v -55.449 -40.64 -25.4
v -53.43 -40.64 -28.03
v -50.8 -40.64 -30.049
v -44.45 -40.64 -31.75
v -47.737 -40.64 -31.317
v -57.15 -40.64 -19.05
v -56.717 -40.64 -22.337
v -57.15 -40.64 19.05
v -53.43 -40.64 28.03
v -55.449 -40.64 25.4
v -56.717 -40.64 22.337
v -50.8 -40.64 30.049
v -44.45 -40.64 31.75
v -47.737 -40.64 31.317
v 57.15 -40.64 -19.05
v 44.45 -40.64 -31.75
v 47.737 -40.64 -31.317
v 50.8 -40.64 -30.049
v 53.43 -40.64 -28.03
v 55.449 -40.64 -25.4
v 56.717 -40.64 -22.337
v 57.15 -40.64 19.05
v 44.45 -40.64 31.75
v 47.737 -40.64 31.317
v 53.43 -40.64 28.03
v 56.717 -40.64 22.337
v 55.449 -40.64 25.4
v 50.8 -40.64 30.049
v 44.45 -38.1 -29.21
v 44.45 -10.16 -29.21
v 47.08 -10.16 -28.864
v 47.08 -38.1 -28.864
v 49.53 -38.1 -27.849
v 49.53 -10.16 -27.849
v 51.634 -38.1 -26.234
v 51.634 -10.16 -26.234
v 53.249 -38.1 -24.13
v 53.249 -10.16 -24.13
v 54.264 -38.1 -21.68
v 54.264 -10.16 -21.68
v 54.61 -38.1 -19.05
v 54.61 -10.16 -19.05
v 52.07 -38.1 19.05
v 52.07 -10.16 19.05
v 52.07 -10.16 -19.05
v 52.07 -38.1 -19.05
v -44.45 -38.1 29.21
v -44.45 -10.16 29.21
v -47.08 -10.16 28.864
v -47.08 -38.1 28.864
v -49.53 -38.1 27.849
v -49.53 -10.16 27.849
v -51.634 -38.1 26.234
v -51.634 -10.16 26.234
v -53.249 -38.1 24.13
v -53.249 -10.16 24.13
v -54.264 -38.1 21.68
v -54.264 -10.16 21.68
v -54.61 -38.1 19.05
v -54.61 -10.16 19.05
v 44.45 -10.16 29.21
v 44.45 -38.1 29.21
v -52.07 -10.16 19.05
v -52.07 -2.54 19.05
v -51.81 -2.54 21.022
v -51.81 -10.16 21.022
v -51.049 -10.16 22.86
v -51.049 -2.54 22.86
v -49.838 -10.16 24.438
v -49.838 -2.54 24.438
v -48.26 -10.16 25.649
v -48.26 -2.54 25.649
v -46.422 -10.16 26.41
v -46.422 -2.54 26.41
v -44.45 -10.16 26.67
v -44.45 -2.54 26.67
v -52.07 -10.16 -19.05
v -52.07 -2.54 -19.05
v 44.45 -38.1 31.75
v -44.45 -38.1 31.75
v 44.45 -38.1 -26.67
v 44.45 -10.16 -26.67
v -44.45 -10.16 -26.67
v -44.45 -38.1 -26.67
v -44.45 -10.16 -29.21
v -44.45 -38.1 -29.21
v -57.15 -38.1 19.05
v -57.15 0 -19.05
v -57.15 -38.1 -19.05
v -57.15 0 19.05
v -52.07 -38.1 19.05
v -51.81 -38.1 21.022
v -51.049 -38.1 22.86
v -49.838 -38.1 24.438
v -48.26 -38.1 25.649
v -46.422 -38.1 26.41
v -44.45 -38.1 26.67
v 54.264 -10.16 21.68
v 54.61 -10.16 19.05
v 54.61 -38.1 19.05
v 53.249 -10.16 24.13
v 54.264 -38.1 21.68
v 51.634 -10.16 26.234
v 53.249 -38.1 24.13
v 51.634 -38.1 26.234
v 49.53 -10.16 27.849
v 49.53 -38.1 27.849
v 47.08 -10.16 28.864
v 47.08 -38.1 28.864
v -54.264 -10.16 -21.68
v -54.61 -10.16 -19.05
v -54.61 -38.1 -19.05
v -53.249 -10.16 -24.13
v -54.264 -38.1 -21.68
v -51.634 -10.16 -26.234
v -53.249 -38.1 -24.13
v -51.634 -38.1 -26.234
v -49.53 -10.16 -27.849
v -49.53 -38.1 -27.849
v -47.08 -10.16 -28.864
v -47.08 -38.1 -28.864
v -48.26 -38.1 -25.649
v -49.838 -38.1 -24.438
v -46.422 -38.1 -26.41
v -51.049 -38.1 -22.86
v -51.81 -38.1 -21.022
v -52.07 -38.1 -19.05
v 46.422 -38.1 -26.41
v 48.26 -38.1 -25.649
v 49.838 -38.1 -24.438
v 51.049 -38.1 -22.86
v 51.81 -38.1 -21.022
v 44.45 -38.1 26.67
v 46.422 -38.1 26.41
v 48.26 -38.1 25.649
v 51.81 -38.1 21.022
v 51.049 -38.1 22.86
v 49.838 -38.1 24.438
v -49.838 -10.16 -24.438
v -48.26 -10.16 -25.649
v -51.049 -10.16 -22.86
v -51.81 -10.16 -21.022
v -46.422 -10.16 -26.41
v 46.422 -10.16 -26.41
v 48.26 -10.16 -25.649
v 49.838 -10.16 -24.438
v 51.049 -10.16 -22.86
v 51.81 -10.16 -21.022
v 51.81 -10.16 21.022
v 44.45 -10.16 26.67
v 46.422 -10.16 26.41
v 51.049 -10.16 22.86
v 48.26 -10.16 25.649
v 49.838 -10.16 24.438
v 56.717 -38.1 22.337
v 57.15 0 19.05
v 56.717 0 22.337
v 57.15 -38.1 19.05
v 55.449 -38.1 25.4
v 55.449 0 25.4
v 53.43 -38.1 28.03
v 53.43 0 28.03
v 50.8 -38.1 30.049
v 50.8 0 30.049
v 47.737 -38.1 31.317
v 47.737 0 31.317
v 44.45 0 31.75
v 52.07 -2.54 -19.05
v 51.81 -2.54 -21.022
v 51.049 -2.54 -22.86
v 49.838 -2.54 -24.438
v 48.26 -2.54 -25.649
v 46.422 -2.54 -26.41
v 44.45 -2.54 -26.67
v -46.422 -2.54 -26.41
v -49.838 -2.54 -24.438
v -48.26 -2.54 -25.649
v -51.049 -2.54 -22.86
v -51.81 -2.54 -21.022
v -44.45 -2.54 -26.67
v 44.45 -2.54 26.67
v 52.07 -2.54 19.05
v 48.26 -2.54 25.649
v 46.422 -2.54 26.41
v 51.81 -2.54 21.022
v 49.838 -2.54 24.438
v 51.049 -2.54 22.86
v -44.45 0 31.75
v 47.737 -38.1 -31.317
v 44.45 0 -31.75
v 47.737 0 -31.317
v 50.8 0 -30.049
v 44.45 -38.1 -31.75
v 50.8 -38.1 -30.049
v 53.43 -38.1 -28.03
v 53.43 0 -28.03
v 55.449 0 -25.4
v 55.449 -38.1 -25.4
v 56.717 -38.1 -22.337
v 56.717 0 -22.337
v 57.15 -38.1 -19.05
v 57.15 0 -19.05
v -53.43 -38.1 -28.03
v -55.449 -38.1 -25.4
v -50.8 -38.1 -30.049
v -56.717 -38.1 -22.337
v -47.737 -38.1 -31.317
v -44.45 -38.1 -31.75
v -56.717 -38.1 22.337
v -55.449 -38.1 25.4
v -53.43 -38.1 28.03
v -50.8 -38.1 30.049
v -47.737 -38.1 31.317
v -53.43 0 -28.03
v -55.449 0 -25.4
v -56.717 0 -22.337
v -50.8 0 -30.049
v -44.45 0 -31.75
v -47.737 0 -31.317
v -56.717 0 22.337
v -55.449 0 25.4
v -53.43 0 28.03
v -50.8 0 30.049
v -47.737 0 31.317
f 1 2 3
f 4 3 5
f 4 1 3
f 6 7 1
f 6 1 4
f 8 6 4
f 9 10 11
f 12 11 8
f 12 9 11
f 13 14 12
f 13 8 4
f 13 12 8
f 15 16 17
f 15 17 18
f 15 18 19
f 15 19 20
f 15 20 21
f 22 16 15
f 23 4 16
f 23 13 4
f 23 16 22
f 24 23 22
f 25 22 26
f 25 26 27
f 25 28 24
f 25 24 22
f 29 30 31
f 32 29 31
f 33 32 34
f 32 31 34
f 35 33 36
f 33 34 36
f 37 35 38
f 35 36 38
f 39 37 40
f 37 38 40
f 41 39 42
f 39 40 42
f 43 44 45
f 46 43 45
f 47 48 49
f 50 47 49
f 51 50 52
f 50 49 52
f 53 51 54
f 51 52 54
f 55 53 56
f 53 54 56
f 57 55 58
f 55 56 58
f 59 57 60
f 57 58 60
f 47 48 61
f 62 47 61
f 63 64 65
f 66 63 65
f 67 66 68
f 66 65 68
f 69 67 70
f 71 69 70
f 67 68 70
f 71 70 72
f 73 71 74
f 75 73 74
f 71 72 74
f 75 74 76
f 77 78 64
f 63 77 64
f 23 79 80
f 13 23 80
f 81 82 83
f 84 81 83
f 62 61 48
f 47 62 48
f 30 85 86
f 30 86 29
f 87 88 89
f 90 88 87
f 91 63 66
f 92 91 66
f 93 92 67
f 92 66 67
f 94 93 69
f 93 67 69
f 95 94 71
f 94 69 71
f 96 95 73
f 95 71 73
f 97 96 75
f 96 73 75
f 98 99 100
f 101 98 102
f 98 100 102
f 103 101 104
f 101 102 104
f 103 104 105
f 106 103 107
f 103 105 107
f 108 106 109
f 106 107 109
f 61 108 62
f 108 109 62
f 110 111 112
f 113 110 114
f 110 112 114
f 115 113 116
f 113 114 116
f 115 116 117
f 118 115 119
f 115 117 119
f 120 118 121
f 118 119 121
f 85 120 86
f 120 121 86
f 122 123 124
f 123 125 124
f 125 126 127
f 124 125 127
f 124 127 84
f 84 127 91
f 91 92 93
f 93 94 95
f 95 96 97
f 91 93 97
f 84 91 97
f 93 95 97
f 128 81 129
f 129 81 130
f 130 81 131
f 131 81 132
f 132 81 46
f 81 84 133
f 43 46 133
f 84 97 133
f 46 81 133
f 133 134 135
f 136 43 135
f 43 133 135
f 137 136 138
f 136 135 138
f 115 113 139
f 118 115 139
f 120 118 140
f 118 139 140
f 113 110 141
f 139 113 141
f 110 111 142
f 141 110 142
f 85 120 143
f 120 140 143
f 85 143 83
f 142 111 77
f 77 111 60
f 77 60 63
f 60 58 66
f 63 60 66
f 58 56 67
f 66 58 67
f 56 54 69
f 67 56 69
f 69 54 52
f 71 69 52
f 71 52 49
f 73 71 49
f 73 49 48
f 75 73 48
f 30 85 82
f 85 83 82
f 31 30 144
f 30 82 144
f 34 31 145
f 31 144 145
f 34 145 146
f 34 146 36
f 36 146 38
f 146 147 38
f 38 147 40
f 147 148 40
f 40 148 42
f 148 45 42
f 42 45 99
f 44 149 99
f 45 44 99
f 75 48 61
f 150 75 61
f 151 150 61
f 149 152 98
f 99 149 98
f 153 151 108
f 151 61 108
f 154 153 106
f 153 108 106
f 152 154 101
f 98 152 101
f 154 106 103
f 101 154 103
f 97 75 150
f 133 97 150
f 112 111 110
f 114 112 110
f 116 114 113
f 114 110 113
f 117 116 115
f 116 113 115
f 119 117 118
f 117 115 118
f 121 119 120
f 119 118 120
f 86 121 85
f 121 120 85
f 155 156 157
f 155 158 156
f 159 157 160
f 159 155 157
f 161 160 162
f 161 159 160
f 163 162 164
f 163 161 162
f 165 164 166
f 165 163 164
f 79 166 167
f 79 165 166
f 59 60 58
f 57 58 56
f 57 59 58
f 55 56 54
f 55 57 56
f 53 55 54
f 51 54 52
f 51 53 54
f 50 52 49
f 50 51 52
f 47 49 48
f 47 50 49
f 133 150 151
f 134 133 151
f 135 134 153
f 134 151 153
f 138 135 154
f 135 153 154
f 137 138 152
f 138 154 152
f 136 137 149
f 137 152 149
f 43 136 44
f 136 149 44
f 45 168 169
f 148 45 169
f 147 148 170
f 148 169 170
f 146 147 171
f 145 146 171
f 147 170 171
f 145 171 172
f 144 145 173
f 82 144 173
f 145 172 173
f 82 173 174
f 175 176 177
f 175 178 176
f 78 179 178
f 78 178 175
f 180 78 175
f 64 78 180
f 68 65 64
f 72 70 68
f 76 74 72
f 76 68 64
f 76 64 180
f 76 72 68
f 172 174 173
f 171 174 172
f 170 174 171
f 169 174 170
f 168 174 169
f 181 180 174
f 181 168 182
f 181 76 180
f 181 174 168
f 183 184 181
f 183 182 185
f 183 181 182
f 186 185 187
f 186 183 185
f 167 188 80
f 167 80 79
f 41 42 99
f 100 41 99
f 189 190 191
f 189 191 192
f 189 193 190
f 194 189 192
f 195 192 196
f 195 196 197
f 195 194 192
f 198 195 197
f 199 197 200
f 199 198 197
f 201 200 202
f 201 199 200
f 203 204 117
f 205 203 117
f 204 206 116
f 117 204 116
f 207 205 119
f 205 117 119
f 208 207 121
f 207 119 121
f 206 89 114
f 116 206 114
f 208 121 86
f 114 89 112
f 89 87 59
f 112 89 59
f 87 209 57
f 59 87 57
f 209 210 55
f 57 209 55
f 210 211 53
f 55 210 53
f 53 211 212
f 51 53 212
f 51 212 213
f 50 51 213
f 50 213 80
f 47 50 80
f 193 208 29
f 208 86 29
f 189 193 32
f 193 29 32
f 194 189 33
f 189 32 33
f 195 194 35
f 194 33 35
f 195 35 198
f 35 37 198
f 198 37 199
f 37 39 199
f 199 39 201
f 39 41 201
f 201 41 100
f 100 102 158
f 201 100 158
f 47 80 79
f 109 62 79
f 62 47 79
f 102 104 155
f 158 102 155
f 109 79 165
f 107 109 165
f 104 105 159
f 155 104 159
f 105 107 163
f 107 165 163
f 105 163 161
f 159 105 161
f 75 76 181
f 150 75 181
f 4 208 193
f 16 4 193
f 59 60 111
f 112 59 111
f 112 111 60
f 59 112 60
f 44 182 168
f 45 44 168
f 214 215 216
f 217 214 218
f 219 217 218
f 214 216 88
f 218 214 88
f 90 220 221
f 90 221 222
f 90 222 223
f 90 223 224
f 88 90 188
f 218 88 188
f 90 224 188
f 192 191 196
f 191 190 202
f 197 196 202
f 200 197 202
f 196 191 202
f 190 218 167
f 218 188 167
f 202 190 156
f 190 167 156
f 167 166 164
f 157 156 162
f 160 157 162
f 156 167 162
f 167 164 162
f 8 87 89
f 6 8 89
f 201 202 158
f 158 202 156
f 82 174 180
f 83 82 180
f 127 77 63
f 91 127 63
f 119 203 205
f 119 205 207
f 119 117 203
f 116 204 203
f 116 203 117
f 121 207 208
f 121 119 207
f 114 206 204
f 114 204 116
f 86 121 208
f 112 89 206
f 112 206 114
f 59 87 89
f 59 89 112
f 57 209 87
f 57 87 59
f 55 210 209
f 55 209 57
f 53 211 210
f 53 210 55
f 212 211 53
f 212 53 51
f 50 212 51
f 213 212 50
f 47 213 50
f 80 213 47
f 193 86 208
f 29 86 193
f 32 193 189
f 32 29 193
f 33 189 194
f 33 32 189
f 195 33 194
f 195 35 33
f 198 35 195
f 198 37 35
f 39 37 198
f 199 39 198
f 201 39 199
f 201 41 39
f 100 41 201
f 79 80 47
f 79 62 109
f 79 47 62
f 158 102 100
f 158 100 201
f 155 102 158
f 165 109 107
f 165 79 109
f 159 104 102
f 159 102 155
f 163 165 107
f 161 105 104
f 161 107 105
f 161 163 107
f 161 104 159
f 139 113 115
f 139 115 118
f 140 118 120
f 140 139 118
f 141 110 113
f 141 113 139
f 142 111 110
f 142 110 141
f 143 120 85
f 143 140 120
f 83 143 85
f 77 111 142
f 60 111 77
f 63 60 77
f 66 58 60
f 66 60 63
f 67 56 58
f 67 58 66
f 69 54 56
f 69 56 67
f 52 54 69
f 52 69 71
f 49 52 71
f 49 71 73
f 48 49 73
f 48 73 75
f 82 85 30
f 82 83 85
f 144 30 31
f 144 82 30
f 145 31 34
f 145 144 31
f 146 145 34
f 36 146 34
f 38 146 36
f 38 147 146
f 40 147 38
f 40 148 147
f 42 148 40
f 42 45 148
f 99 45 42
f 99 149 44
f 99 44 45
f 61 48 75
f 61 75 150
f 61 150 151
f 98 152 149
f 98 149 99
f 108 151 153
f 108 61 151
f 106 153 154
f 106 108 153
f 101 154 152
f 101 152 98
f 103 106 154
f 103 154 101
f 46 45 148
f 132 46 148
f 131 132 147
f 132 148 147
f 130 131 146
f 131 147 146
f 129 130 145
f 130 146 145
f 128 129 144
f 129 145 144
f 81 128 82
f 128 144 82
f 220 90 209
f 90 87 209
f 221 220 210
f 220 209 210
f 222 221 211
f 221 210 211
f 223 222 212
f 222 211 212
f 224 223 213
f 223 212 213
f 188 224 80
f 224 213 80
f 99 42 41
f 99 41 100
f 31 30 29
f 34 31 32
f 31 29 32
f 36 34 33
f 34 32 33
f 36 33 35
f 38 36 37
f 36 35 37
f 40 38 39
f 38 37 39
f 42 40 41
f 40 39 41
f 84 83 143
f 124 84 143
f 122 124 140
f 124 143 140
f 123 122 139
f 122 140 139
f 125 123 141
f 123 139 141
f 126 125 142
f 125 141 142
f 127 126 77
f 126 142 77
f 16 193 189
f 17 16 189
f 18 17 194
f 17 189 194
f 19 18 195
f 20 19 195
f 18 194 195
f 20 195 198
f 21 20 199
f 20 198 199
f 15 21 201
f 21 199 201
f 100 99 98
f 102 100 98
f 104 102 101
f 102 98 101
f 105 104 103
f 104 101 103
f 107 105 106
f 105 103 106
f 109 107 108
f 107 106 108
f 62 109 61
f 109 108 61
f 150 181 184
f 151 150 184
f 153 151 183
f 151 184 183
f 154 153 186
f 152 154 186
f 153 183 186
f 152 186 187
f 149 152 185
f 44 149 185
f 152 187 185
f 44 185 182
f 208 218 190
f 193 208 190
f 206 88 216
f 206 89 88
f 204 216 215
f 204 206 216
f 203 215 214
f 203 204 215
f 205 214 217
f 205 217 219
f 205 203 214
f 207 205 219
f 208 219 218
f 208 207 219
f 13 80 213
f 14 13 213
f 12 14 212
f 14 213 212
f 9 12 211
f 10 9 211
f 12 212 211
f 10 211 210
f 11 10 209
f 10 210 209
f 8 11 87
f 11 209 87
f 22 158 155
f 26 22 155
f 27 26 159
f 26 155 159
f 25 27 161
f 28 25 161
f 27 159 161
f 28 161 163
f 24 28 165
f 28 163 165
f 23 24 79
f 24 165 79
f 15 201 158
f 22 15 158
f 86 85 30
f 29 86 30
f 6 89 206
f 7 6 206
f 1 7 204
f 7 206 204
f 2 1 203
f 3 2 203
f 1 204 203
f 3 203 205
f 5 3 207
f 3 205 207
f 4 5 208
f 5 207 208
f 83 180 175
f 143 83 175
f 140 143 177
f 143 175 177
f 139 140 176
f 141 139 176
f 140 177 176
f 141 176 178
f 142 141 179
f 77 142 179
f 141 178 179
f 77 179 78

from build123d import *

# Parameters (mm, degrees)
F5_W     = 114.3
F5_H     = 63.5
F6_DEPTH = 38.1
F0_R     = 12.7
F1_T     = -2.54
F8_DEPTH = 7.62
F9_DEPTH = 27.94
F3_DEPTH = 2.54


with BuildPart() as f6:
    # F5 (on Front) → F6 (new body)
    with BuildSketch(Plane.XZ):
        Rectangle(F5_W, F5_H)
    extrude(amount=F6_DEPTH)

    # F0
    f0_edges = [f6.edges().sort_by_distance(p)[0] for p in [
        (57.15, -19.05, 31.75),
        (57.15, -19.05, -31.75),
        (-57.15, -19.05, -31.75),
        (-57.15, -19.05, 31.75),
    ]]
    fillet(f0_edges, radius=F0_R)

    # F1
    f1_openings = [f6.faces().sort_by_distance(p)[0] for p in [
        (0, -38.1, 0),
    ]]
    offset(amount=F1_T, openings=f1_openings)

    # F7 (on face) → F8 (join)
    with BuildSketch(Plane.XZ.offset(2.54)):
        with BuildLine():
            ThreePointArc((54.61, 19.05), (51.6342048969, 26.2342048969), (44.45, 29.21))
            Line((44.45, 29.21), (-44.45, 29.21))
            ThreePointArc((-44.45, 29.21), (-51.6342048969, 26.2342048969), (-54.61, 19.05))
            Line((-54.61, 19.05), (-54.61, -19.05))
            ThreePointArc((-54.61, -19.05), (-51.6342048969, -26.2342048969), (-44.45, -29.21))
            Line((-44.45, -29.21), (44.45, -29.21))
            ThreePointArc((44.45, -29.21), (51.6342048969, -26.2342048969), (54.61, -19.05))
            Line((54.61, -19.05), (54.61, 19.05))
        make_face()
        with BuildLine():
            Line((-44.45, 26.67), (44.45, 26.67))
            ThreePointArc((44.45, 26.67), (49.8381536726, 24.4381536726), (52.07, 19.05))
            Line((52.07, 19.05), (52.07, -19.05))
            ThreePointArc((52.07, -19.05), (49.8381536726, -24.4381536726), (44.45, -26.67))
            Line((44.45, -26.67), (-44.45, -26.67))
            ThreePointArc((-44.45, -26.67), (-49.8381536726, -24.4381536726), (-52.07, -19.05))
            Line((-52.07, -19.05), (-52.07, 19.05))
            ThreePointArc((-52.07, 19.05), (-49.8381536726, 24.4381536726), (-44.45, 26.67))
        make_face(mode=Mode.SUBTRACT)
    extrude(amount=F8_DEPTH)


with BuildPart() as f9:
    # F9 (new): a face of the model
    f9_faces = [f6.part.faces().sort_by_distance(p)[0] for p in [
        (50.7583651627, -10.16, 25.3583651627),
    ]]
    extrude(f9_faces, amount=F9_DEPTH)

    # F2 (on face) → F3 (join)
    with BuildSketch(Plane.XZ.offset(38.1)):
        with BuildLine():
            ThreePointArc((44.45, -31.75), (53.4302561211, -28.0302561211), (57.15, -19.05))
            Line((57.15, -19.05), (57.15, 19.05))
            ThreePointArc((57.15, 19.05), (53.4302561211, 28.0302561211), (44.45, 31.75))
            Line((44.45, 31.75), (-44.45, 31.75))
            ThreePointArc((-44.45, 31.75), (-53.4302561211, 28.0302561211), (-57.15, 19.05))
            Line((-57.15, 19.05), (-57.15, -19.05))
            ThreePointArc((-57.15, -19.05), (-53.4302561211, -28.0302561211), (-44.45, -31.75))
            Line((-44.45, -31.75), (44.45, -31.75))
        make_face()
    extrude(amount=F3_DEPTH)


solid = Compound([f6.part, f9.part])
